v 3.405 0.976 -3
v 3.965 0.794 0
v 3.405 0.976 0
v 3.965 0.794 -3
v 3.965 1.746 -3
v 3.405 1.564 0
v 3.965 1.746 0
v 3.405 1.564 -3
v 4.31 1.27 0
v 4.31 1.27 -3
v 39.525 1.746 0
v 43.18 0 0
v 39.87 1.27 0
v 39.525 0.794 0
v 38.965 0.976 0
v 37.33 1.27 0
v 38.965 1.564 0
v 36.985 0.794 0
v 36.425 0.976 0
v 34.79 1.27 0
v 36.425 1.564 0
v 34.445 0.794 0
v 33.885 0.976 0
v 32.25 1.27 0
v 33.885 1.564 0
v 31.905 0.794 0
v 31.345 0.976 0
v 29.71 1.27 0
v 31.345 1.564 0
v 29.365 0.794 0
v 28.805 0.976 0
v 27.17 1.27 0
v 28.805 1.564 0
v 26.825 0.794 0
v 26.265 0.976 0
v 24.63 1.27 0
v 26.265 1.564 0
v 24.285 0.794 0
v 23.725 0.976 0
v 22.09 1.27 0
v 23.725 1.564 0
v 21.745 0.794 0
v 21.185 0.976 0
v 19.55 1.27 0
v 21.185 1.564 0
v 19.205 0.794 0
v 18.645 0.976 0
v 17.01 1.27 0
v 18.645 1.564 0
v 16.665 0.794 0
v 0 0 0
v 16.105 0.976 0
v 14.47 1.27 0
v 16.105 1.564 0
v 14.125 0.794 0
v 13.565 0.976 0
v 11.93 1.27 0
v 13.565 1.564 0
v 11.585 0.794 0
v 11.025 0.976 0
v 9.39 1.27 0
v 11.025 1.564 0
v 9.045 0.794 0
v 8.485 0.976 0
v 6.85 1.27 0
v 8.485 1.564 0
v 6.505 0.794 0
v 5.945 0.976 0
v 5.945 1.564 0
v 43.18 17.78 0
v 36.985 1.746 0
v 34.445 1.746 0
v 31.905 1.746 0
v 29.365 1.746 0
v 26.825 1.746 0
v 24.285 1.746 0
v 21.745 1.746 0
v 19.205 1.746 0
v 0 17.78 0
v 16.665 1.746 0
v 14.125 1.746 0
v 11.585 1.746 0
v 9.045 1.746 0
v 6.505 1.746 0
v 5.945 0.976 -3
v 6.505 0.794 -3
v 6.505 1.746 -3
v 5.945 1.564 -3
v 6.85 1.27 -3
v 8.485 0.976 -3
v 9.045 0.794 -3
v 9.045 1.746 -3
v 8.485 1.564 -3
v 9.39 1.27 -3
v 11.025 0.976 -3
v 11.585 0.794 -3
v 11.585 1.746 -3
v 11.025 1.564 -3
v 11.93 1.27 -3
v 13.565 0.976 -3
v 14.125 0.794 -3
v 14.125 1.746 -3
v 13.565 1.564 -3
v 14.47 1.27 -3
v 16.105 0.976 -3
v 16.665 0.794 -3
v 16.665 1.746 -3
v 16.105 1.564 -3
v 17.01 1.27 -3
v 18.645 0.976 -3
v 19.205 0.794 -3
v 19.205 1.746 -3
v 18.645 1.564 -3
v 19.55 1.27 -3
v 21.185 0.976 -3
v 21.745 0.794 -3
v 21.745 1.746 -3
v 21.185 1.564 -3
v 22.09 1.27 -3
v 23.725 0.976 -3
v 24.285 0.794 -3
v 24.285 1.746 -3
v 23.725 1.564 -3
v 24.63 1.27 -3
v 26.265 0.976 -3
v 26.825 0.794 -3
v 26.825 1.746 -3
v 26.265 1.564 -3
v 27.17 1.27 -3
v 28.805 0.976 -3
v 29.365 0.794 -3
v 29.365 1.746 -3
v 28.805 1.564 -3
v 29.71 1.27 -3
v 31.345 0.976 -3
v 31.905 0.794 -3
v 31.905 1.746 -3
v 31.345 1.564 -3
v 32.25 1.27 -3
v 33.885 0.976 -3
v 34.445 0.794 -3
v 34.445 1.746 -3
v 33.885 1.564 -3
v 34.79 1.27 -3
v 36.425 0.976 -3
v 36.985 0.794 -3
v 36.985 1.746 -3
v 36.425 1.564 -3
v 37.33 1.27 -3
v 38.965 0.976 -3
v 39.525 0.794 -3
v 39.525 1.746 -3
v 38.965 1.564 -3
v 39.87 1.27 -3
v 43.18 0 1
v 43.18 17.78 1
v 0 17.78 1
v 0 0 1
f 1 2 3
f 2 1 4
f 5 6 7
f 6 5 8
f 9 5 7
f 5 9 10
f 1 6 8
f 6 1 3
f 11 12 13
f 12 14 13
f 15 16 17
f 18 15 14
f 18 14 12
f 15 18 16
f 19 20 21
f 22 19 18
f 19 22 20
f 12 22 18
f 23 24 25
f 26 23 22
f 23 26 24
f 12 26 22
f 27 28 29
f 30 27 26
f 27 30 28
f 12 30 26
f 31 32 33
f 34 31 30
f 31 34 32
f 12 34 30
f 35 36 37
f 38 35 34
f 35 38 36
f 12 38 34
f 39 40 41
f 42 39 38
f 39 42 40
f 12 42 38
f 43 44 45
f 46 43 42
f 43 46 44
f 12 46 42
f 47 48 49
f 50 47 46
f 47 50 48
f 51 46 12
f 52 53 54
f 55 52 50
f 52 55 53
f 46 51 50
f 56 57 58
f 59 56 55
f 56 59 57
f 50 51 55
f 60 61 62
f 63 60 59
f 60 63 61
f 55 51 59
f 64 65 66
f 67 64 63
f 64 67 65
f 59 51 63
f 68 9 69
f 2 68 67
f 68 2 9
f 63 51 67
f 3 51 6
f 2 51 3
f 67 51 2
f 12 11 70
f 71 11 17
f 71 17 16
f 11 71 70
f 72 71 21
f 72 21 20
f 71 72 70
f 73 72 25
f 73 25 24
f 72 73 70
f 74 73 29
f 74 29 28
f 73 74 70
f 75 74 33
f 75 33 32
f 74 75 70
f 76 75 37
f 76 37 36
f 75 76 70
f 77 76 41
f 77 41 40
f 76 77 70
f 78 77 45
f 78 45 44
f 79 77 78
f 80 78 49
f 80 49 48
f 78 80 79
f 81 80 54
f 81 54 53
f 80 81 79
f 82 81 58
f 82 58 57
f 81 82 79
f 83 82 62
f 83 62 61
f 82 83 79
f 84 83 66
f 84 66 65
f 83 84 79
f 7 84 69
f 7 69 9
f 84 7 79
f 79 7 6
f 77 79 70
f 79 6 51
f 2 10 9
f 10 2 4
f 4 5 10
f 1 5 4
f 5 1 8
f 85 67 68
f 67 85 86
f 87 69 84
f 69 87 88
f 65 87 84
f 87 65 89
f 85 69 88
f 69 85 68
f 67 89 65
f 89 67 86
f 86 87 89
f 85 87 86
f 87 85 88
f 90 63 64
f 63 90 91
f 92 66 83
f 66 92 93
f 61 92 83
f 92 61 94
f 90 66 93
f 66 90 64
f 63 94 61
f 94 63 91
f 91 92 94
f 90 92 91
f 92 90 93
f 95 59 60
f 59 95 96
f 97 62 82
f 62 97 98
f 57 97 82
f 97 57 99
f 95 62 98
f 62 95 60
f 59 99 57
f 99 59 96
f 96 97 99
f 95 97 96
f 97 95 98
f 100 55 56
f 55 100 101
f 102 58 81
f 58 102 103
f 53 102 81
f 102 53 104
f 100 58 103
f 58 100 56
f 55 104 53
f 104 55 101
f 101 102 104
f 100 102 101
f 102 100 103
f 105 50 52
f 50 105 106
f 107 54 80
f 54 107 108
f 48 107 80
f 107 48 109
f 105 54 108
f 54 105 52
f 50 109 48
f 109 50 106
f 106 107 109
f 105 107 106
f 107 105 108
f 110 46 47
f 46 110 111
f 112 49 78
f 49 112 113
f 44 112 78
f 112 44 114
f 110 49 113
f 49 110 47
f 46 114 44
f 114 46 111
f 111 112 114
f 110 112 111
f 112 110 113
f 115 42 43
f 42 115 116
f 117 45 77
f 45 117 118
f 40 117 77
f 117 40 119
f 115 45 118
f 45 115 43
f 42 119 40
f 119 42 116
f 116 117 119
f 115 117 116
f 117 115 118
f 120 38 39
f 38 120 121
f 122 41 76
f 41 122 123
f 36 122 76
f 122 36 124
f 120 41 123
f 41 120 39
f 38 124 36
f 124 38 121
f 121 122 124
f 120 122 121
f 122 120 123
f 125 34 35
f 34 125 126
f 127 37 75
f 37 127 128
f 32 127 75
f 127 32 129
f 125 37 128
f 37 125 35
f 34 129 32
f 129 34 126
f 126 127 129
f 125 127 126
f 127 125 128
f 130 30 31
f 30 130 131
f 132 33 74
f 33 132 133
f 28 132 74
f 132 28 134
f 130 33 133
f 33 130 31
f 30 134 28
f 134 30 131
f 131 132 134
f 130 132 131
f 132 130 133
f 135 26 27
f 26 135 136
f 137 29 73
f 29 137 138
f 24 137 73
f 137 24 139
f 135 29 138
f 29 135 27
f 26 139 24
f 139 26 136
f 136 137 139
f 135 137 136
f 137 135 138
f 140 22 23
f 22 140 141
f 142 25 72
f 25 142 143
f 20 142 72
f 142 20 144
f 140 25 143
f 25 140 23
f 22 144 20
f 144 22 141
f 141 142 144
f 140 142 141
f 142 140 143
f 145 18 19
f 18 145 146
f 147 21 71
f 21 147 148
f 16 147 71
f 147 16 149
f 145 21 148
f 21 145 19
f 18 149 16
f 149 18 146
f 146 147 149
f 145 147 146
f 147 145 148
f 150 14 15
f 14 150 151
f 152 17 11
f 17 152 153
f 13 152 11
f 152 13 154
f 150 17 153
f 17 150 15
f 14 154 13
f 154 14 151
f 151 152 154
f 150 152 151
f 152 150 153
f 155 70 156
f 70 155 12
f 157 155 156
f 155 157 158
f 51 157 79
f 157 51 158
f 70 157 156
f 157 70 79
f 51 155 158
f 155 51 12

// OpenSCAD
// file: metrics.scad
// CARD (https://www.ebay.de/itm/273026026604)
CW = 85.0;//mm card width   < 34 x 2.54
CH = 54.0;//mm card height  < 22 x 2.54 
CT =  0.9;//mm card thickness

// POCKET (https://www.hornbach.de/shop/Hobbyglas-2x250x500-mm-Glatt-klar/1477798/artikel.html)
PW = 38 * 2.54;//mm width
PH = 23 * 2.54;//mm height
PT =  1 * 2.00;//mm thickness
PP =  2 * 1.00;//mm pocket padding (left/right)

// PCB (https://www.ebay.de/itm/183729215412)
PCBH = PH + 8 * 2.54;//mm height
PCBT = 1.2;//mm thickness
PCBD = 0.5;//mm drillings radius

// FRONT
FW = 245;//mm WIDTH
FH = 140;//mm HEIGHT
FT =   5;//mm thickness
FS = 100;//mm SPEAKER DIAMETER
FB = 16; //mm BUTTON DIAMETER
// main file
include <metrics.scad>;

module ARDUINO(){
    color("SteelBlue")cube([17*2.54,7*2.54,1]);
    color("LightGrey")for(X = [2.54/2*3 : 2.54 : 17*2.54-2.54/2*3]){
        translate([X,2.54/2,-3])cylinder(3,0.5,0.5);
    }
}

ARDUINO();
